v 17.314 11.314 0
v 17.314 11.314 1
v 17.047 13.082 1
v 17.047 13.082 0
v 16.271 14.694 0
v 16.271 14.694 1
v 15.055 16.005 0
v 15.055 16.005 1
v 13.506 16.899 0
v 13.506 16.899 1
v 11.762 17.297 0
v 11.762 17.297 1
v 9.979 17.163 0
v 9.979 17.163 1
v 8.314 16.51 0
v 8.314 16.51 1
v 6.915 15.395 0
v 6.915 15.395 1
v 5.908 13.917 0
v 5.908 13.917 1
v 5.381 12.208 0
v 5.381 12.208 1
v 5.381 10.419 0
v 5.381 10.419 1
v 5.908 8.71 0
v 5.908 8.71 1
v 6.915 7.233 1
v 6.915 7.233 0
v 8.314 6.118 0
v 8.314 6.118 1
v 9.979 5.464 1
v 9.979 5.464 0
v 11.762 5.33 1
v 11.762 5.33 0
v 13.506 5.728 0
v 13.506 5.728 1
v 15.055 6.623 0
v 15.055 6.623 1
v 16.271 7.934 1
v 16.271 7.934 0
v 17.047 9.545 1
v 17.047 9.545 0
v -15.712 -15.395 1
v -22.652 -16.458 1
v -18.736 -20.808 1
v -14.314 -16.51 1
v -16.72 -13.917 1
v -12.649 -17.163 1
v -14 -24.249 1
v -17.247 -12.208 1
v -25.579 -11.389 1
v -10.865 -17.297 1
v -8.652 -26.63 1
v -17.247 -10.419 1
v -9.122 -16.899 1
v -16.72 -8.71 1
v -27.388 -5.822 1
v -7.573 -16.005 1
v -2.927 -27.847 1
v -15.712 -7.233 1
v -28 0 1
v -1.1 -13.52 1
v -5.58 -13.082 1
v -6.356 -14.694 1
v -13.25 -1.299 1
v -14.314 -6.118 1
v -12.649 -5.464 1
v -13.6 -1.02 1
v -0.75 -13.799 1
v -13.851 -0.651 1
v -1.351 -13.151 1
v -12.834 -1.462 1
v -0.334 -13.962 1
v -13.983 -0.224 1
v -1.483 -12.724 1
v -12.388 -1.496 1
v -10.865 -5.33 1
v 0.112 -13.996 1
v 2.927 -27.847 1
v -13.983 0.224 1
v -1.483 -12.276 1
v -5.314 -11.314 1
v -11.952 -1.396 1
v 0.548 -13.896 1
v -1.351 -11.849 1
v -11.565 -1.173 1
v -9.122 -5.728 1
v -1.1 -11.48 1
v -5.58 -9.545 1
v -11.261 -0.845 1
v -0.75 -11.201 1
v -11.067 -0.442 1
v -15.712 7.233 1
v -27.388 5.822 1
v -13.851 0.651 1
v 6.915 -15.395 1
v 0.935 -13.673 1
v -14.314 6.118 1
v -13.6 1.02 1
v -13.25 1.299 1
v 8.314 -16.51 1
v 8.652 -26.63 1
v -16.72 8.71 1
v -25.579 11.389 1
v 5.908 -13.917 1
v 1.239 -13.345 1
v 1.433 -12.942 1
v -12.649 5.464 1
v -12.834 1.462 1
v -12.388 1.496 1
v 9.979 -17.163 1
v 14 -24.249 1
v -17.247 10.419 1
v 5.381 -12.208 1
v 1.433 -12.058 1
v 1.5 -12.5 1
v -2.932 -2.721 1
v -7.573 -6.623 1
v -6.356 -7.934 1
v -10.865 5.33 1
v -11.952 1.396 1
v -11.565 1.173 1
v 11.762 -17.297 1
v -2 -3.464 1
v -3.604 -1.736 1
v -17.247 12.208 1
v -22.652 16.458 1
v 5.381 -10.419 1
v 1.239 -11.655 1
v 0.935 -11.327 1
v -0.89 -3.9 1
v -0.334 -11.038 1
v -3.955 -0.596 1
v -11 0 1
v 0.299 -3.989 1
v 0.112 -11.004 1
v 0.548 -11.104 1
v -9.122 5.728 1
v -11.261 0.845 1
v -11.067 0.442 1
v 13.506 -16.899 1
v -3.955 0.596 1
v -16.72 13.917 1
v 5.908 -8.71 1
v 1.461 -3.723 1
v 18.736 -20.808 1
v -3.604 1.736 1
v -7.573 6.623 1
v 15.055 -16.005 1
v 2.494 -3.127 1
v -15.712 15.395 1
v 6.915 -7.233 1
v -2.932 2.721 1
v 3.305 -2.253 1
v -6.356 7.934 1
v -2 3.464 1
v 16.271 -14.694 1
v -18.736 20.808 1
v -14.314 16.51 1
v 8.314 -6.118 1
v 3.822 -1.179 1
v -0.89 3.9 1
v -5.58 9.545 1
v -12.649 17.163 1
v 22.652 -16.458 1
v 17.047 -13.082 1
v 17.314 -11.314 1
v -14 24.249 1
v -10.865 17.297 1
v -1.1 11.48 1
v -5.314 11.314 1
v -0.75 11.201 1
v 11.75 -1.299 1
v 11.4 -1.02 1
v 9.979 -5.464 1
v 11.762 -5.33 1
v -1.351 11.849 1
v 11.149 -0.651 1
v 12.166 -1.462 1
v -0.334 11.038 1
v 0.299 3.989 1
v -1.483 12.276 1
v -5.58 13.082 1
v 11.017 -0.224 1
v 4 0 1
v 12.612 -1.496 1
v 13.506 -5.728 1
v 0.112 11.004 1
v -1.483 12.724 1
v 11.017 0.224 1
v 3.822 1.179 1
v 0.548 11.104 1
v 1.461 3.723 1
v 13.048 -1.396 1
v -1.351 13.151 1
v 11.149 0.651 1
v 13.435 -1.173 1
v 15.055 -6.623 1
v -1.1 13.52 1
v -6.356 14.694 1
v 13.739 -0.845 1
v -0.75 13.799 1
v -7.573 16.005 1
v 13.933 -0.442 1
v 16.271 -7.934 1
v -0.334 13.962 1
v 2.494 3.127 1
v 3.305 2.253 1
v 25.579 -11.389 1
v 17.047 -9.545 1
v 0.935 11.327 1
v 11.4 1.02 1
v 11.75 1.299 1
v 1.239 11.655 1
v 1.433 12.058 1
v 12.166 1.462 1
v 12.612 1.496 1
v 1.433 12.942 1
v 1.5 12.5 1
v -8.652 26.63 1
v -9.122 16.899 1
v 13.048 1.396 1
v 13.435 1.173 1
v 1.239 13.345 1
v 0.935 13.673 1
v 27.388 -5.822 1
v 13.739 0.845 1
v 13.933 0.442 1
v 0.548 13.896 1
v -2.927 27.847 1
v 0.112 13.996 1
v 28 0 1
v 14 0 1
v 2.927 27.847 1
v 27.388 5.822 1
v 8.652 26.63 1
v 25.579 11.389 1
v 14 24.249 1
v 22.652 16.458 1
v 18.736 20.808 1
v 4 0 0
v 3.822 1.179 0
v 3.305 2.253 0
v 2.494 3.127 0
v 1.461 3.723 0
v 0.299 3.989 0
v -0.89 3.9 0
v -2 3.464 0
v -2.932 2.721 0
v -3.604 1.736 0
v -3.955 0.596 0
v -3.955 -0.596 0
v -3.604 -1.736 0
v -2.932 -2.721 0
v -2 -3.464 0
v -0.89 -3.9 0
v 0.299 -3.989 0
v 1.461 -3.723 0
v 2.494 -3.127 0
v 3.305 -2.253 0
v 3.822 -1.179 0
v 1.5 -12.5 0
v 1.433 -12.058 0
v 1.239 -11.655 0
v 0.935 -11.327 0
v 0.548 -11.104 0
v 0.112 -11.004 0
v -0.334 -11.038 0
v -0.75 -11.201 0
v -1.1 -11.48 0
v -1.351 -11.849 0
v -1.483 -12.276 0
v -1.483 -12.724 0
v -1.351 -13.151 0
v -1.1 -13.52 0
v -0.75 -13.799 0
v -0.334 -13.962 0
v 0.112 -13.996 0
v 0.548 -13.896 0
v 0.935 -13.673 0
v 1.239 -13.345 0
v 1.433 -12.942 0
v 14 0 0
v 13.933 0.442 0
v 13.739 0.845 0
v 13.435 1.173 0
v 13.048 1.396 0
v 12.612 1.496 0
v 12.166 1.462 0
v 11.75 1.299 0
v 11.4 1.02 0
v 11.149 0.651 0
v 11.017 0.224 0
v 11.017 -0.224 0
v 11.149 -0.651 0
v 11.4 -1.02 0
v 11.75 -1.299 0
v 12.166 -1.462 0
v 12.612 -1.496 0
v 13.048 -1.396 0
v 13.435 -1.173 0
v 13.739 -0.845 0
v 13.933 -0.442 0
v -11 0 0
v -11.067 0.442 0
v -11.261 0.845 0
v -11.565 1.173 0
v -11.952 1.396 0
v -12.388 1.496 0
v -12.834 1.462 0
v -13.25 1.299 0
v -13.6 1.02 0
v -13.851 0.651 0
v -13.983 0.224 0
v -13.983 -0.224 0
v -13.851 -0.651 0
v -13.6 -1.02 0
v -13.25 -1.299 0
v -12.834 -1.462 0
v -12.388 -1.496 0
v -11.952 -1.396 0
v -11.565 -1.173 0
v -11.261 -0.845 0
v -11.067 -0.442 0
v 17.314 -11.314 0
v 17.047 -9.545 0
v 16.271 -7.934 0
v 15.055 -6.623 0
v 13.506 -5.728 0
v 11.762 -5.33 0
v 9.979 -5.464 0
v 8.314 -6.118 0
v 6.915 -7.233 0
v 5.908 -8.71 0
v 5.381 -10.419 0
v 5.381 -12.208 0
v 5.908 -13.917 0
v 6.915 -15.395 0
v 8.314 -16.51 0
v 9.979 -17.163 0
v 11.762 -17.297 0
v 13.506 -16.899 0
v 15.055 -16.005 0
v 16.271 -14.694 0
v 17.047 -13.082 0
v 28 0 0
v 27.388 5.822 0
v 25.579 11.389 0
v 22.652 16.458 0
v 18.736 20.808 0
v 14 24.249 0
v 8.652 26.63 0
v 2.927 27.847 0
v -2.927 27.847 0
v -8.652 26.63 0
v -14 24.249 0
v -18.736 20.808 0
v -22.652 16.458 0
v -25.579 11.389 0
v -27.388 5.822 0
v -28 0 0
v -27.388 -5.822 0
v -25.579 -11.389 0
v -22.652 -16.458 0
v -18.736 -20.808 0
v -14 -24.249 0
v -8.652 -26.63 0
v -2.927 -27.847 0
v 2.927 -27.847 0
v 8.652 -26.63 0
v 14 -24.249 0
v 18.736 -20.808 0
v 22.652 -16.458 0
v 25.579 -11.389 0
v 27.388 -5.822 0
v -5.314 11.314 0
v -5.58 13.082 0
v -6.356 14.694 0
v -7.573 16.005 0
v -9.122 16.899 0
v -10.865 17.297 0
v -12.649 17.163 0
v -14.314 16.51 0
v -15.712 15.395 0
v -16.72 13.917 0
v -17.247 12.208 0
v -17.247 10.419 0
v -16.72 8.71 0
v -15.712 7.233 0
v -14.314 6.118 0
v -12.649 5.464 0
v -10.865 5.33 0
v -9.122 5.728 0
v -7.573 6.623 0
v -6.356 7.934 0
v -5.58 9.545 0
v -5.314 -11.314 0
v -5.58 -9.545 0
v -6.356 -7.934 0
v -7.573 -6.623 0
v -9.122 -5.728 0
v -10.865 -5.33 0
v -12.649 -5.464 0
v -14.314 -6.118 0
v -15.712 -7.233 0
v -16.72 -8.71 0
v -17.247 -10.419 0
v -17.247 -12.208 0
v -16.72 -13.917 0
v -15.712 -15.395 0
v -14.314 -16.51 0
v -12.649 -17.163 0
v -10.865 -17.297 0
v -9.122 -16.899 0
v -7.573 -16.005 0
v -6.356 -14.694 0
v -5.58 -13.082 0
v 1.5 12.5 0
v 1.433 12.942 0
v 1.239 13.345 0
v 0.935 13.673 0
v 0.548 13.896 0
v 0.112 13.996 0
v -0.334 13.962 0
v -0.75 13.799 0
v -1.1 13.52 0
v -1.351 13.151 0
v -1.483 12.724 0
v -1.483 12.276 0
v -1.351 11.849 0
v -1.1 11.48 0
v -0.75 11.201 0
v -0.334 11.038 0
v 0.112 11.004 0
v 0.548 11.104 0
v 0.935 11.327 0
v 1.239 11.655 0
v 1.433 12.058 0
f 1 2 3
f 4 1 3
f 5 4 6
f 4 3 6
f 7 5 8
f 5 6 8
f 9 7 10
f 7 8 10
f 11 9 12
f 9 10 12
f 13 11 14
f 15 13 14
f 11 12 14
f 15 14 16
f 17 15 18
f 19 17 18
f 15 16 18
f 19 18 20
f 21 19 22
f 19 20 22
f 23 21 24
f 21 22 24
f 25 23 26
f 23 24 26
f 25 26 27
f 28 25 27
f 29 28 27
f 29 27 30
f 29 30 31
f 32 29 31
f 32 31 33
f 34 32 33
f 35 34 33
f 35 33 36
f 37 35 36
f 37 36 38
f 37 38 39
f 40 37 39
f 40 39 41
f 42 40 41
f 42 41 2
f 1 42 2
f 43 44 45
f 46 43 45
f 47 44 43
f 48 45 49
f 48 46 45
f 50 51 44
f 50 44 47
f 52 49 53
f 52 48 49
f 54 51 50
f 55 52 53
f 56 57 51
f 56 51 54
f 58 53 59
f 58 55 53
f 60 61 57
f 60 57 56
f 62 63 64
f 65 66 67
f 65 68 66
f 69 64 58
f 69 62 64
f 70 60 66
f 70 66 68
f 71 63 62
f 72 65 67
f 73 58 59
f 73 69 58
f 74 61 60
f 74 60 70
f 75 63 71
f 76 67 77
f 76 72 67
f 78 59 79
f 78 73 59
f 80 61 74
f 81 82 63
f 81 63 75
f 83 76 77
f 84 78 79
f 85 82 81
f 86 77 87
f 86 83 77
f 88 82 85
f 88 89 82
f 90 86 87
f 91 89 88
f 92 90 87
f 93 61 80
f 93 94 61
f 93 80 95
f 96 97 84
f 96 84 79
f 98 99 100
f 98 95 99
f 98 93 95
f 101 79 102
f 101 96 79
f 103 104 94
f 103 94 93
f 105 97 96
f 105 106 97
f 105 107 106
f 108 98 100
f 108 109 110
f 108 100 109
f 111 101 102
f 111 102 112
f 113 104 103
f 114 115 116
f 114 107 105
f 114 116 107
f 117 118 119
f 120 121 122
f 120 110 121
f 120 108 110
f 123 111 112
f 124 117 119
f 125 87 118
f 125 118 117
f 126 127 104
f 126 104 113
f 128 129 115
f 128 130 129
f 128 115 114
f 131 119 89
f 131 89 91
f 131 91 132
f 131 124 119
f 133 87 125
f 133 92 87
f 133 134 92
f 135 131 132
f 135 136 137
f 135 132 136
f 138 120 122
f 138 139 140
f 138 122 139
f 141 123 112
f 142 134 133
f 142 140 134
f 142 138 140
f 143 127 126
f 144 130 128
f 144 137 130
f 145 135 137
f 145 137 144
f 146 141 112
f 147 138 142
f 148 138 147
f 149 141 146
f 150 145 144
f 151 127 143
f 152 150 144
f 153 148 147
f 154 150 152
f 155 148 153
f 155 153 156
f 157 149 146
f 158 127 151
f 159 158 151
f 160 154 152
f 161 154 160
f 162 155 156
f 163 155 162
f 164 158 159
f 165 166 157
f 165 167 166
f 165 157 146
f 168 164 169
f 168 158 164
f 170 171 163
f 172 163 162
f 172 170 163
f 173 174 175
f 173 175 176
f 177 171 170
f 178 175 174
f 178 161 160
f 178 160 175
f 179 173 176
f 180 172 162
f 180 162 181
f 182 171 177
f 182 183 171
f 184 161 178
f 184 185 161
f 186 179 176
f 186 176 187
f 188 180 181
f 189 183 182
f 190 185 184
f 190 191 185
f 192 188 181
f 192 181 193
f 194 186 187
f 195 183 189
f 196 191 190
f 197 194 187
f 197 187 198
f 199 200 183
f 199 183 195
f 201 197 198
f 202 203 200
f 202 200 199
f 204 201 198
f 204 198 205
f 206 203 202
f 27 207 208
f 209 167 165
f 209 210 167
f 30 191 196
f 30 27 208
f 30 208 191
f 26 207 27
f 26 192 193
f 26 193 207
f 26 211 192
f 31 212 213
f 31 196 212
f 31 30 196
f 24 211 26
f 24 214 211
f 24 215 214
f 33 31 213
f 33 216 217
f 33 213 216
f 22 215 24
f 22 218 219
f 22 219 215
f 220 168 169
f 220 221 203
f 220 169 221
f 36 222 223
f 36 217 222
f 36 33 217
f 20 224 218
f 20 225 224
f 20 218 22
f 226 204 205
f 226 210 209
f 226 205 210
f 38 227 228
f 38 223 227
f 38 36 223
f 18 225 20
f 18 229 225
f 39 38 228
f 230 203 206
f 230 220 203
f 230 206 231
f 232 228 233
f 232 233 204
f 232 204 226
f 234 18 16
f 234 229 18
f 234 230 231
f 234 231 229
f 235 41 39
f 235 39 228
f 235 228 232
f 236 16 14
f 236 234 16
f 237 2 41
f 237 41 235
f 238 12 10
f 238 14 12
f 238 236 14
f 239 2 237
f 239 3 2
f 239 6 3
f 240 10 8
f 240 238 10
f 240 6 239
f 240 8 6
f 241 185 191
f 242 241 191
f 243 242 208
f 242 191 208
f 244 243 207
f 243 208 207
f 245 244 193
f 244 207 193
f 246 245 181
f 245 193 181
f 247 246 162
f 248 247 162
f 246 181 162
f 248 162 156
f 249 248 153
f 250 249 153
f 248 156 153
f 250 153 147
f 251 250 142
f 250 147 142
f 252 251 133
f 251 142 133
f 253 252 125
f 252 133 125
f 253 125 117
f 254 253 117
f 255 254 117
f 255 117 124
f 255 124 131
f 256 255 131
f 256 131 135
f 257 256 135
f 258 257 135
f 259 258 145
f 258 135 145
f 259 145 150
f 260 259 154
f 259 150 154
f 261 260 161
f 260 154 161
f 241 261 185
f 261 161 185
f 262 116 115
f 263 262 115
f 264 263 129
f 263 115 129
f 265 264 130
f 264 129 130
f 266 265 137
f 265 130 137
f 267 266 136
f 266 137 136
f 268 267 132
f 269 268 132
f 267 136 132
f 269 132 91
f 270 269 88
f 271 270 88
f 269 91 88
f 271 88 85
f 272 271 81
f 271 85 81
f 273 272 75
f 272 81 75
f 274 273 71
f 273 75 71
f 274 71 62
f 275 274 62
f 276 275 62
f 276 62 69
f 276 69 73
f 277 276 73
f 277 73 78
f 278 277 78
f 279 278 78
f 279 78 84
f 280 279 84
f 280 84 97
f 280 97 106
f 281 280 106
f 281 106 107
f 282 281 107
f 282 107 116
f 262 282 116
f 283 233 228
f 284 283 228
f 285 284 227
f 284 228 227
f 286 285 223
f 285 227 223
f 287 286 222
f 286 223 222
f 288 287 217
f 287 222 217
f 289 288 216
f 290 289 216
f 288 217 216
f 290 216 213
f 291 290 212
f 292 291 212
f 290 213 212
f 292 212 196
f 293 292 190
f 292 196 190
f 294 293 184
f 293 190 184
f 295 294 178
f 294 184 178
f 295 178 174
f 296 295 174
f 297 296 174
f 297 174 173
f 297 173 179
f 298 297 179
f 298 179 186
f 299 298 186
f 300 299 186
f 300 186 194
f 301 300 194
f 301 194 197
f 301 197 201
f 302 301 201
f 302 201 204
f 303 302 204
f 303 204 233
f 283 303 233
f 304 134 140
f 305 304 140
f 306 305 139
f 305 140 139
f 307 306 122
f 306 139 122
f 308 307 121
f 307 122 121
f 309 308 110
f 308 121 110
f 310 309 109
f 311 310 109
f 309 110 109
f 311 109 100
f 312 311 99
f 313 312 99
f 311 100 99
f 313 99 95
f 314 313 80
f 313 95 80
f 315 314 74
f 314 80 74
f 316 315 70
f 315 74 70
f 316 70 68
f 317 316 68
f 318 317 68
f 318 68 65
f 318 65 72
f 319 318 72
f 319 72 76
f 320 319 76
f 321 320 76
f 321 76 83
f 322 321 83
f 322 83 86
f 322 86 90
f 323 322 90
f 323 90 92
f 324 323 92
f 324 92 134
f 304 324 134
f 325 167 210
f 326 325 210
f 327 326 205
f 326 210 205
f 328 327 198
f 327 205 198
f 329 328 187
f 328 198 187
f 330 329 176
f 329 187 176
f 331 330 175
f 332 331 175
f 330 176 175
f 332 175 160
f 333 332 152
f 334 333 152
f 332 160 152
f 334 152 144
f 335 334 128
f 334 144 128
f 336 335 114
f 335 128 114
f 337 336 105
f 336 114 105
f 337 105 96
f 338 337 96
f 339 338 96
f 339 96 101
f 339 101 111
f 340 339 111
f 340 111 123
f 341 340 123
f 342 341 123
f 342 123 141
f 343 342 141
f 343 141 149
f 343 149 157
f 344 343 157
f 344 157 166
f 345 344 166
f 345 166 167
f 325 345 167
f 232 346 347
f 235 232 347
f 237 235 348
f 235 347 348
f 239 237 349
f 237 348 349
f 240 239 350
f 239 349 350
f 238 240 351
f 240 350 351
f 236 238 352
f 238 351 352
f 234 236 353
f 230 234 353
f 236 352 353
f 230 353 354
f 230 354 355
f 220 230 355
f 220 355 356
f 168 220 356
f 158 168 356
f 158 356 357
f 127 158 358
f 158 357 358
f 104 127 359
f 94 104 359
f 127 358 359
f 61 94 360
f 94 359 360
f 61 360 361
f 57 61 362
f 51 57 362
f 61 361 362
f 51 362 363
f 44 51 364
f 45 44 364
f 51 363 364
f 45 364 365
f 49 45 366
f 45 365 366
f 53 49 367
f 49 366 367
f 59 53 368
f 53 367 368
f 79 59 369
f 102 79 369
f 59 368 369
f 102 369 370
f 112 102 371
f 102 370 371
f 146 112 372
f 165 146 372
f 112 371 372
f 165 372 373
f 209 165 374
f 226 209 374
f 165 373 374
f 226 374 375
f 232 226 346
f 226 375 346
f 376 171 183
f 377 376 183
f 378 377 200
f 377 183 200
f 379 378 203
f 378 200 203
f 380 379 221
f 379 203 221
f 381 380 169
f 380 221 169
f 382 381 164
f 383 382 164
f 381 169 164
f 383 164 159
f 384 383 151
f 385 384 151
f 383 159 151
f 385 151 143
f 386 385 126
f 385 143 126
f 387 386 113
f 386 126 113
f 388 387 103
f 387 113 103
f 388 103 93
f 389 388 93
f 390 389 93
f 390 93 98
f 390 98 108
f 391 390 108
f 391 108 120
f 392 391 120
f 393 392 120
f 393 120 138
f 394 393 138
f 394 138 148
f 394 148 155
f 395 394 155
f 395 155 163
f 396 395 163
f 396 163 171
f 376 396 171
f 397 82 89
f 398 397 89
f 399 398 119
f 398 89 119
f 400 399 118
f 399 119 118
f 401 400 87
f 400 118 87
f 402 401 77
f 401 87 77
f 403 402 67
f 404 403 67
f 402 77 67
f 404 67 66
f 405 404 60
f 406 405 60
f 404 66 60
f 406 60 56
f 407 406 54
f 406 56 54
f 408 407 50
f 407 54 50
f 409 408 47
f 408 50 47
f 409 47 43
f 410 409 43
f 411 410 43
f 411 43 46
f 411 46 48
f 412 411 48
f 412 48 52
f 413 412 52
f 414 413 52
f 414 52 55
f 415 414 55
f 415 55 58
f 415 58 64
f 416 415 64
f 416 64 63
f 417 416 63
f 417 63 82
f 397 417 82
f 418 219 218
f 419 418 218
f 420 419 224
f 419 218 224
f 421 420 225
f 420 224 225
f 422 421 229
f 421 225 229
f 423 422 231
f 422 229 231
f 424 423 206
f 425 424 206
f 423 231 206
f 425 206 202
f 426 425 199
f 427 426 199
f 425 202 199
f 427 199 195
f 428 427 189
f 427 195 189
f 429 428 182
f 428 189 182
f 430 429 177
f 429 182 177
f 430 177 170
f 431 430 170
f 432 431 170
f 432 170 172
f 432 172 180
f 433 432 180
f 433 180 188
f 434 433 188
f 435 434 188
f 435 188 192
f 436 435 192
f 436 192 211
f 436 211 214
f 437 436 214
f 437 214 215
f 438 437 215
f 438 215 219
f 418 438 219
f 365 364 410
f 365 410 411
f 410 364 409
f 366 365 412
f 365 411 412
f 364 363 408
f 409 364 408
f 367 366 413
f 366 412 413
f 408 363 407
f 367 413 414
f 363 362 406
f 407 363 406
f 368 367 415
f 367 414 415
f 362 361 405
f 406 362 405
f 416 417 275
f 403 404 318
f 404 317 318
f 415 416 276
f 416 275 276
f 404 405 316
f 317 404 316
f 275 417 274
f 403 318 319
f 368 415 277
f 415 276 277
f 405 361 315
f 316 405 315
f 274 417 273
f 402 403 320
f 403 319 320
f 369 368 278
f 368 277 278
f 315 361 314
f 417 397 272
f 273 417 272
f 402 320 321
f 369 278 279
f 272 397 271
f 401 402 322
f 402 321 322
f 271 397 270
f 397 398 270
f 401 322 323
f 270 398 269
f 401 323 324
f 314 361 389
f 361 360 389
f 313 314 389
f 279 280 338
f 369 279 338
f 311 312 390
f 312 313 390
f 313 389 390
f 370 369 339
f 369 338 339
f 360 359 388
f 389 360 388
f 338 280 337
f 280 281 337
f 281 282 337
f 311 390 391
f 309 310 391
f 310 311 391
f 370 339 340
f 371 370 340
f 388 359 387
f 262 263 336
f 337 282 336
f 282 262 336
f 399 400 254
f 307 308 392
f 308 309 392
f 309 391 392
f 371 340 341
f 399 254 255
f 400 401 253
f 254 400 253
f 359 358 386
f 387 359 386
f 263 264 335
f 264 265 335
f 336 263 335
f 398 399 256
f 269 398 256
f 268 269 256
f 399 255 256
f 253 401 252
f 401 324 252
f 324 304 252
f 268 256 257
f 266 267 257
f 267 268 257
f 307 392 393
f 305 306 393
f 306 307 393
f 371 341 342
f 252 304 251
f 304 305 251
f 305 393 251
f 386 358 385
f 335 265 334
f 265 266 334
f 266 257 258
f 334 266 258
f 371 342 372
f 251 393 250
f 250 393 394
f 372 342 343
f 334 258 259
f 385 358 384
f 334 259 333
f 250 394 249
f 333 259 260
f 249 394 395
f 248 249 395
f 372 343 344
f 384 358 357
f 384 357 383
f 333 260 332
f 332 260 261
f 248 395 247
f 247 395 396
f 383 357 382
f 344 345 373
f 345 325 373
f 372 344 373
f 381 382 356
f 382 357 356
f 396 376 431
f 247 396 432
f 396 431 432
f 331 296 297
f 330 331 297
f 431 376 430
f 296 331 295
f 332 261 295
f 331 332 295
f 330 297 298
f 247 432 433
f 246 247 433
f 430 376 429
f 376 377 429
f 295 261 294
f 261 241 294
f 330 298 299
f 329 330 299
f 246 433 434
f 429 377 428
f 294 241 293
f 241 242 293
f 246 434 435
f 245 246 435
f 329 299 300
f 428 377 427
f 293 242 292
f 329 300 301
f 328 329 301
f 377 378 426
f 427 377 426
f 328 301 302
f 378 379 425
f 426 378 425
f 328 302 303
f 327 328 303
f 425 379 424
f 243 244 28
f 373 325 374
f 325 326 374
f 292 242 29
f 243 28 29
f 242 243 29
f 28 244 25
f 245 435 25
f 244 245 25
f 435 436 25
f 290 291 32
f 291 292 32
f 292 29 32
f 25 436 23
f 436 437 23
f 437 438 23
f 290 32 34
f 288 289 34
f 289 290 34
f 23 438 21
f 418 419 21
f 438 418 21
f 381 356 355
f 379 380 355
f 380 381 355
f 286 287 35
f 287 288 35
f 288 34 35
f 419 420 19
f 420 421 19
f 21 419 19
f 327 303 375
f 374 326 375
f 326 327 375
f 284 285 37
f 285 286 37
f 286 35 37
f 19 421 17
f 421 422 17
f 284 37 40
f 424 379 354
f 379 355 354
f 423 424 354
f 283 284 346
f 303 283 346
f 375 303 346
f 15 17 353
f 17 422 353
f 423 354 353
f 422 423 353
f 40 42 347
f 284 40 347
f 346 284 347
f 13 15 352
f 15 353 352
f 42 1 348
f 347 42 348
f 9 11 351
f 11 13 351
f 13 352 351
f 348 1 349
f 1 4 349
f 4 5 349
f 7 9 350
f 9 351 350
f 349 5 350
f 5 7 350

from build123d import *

# Parameters (mm, degrees)
SKETCH_1_R          = 28
EXTRUDE_1_DEPTH     = 1
SKETCH_2_R          = 4
CUT_EXTRUDE_1_DEPTH = 1
CUT_EXTRUDE_2_REACH = 41.611
SKETCH_3_R          = 1.5
CUT_EXTRUDE_3_REACH = 41.611
SKETCH_4_R          = 6


with BuildPart() as part:
    # 草图1 → 凸台-拉伸1 (new body)
    with BuildSketch(Plane.XY):
        Circle(SKETCH_1_R)
    extrude(amount=EXTRUDE_1_DEPTH)

    # 草图2 → 切除-拉伸1 (cut)
    with BuildSketch(Plane.XY.offset(1)):
        Circle(SKETCH_2_R)
    extrude(amount=-CUT_EXTRUDE_1_DEPTH, mode=Mode.SUBTRACT)

    # 草图3 → 切除-拉伸2 (cut, up to next)
    with BuildSketch(Plane.XY.offset(1), mode=Mode.PRIVATE) as cut_extrude_2_sk1:
        with Locations((0, 12.5)):
            Circle(SKETCH_3_R)
    cut_extrude_2_tool1 = extrude(cut_extrude_2_sk1.sketch, amount=-CUT_EXTRUDE_2_REACH, mode=Mode.PRIVATE) & part.part
    # 草图3 → 切除-拉伸2 (cut, up to next)
    with BuildSketch(Plane.XY.offset(1), mode=Mode.PRIVATE) as cut_extrude_2_sk2:
        with Locations((0, -12.5)):
            Circle(SKETCH_3_R)
    cut_extrude_2_tool2 = extrude(cut_extrude_2_sk2.sketch, amount=-CUT_EXTRUDE_2_REACH, mode=Mode.PRIVATE) & part.part
    # 草图3 → 切除-拉伸2 (cut, up to next)
    with BuildSketch(Plane.XY.offset(1), mode=Mode.PRIVATE) as cut_extrude_2_sk3:
        with Locations((12.5, 0)):
            Circle(SKETCH_3_R)
    cut_extrude_2_tool3 = extrude(cut_extrude_2_sk3.sketch, amount=-CUT_EXTRUDE_2_REACH, mode=Mode.PRIVATE) & part.part
    # 草图3 → 切除-拉伸2 (cut, up to next)
    with BuildSketch(Plane.XY.offset(1), mode=Mode.PRIVATE) as cut_extrude_2_sk4:
        with Locations((-12.5, 0)):
            Circle(SKETCH_3_R)
    cut_extrude_2_tool4 = extrude(cut_extrude_2_sk4.sketch, amount=-CUT_EXTRUDE_2_REACH, mode=Mode.PRIVATE) & part.part
    add(cut_extrude_2_tool1.solids().sort_by_distance((0, 12.5, 1))[0], mode=Mode.SUBTRACT)
    add(cut_extrude_2_tool2.solids().sort_by_distance((0, -12.5, 1))[0], mode=Mode.SUBTRACT)
    add(cut_extrude_2_tool3.solids().sort_by_distance((12.5, 0, 1))[0], mode=Mode.SUBTRACT)
    add(cut_extrude_2_tool4.solids().sort_by_distance((-12.5, 0, 1))[0], mode=Mode.SUBTRACT)

    # 草图4 → 切除-拉伸3 (cut, up to next)
    with BuildSketch(Plane.XY.offset(1), mode=Mode.PRIVATE) as cut_extrude_3_sk1:
        with Locations((11.313708499, -11.313708499)):
            Circle(SKETCH_4_R)
    cut_extrude_3_tool1 = extrude(cut_extrude_3_sk1.sketch, amount=-CUT_EXTRUDE_3_REACH, mode=Mode.PRIVATE) & part.part
    # 草图4 → 切除-拉伸3 (cut, up to next)
    with BuildSketch(Plane.XY.offset(1), mode=Mode.PRIVATE) as cut_extrude_3_sk2:
        with Locations((-11.313708499, -11.313708499)):
            Circle(SKETCH_4_R)
    cut_extrude_3_tool2 = extrude(cut_extrude_3_sk2.sketch, amount=-CUT_EXTRUDE_3_REACH, mode=Mode.PRIVATE) & part.part
    # 草图4 → 切除-拉伸3 (cut, up to next)
    with BuildSketch(Plane.XY.offset(1), mode=Mode.PRIVATE) as cut_extrude_3_sk3:
        with Locations((-11.313708499, 11.313708499)):
            Circle(SKETCH_4_R)
    cut_extrude_3_tool3 = extrude(cut_extrude_3_sk3.sketch, amount=-CUT_EXTRUDE_3_REACH, mode=Mode.PRIVATE) & part.part
    # 草图4 → 切除-拉伸3 (cut, up to next)
    with BuildSketch(Plane.XY.offset(1), mode=Mode.PRIVATE) as cut_extrude_3_sk4:
        with Locations((11.313708499, 11.313708499)):
            Circle(SKETCH_4_R)
    cut_extrude_3_tool4 = extrude(cut_extrude_3_sk4.sketch, amount=-CUT_EXTRUDE_3_REACH, mode=Mode.PRIVATE) & part.part
    add(cut_extrude_3_tool1.solids().sort_by_distance((11.313708, -11.313708, 1))[0], mode=Mode.SUBTRACT)
    add(cut_extrude_3_tool2.solids().sort_by_distance((-11.313708, -11.313708, 1))[0], mode=Mode.SUBTRACT)
    add(cut_extrude_3_tool3.solids().sort_by_distance((-11.313708, 11.313708, 1))[0], mode=Mode.SUBTRACT)
    add(cut_extrude_3_tool4.solids().sort_by_distance((11.313708, 11.313708, 1))[0], mode=Mode.SUBTRACT)


solid = part.part
